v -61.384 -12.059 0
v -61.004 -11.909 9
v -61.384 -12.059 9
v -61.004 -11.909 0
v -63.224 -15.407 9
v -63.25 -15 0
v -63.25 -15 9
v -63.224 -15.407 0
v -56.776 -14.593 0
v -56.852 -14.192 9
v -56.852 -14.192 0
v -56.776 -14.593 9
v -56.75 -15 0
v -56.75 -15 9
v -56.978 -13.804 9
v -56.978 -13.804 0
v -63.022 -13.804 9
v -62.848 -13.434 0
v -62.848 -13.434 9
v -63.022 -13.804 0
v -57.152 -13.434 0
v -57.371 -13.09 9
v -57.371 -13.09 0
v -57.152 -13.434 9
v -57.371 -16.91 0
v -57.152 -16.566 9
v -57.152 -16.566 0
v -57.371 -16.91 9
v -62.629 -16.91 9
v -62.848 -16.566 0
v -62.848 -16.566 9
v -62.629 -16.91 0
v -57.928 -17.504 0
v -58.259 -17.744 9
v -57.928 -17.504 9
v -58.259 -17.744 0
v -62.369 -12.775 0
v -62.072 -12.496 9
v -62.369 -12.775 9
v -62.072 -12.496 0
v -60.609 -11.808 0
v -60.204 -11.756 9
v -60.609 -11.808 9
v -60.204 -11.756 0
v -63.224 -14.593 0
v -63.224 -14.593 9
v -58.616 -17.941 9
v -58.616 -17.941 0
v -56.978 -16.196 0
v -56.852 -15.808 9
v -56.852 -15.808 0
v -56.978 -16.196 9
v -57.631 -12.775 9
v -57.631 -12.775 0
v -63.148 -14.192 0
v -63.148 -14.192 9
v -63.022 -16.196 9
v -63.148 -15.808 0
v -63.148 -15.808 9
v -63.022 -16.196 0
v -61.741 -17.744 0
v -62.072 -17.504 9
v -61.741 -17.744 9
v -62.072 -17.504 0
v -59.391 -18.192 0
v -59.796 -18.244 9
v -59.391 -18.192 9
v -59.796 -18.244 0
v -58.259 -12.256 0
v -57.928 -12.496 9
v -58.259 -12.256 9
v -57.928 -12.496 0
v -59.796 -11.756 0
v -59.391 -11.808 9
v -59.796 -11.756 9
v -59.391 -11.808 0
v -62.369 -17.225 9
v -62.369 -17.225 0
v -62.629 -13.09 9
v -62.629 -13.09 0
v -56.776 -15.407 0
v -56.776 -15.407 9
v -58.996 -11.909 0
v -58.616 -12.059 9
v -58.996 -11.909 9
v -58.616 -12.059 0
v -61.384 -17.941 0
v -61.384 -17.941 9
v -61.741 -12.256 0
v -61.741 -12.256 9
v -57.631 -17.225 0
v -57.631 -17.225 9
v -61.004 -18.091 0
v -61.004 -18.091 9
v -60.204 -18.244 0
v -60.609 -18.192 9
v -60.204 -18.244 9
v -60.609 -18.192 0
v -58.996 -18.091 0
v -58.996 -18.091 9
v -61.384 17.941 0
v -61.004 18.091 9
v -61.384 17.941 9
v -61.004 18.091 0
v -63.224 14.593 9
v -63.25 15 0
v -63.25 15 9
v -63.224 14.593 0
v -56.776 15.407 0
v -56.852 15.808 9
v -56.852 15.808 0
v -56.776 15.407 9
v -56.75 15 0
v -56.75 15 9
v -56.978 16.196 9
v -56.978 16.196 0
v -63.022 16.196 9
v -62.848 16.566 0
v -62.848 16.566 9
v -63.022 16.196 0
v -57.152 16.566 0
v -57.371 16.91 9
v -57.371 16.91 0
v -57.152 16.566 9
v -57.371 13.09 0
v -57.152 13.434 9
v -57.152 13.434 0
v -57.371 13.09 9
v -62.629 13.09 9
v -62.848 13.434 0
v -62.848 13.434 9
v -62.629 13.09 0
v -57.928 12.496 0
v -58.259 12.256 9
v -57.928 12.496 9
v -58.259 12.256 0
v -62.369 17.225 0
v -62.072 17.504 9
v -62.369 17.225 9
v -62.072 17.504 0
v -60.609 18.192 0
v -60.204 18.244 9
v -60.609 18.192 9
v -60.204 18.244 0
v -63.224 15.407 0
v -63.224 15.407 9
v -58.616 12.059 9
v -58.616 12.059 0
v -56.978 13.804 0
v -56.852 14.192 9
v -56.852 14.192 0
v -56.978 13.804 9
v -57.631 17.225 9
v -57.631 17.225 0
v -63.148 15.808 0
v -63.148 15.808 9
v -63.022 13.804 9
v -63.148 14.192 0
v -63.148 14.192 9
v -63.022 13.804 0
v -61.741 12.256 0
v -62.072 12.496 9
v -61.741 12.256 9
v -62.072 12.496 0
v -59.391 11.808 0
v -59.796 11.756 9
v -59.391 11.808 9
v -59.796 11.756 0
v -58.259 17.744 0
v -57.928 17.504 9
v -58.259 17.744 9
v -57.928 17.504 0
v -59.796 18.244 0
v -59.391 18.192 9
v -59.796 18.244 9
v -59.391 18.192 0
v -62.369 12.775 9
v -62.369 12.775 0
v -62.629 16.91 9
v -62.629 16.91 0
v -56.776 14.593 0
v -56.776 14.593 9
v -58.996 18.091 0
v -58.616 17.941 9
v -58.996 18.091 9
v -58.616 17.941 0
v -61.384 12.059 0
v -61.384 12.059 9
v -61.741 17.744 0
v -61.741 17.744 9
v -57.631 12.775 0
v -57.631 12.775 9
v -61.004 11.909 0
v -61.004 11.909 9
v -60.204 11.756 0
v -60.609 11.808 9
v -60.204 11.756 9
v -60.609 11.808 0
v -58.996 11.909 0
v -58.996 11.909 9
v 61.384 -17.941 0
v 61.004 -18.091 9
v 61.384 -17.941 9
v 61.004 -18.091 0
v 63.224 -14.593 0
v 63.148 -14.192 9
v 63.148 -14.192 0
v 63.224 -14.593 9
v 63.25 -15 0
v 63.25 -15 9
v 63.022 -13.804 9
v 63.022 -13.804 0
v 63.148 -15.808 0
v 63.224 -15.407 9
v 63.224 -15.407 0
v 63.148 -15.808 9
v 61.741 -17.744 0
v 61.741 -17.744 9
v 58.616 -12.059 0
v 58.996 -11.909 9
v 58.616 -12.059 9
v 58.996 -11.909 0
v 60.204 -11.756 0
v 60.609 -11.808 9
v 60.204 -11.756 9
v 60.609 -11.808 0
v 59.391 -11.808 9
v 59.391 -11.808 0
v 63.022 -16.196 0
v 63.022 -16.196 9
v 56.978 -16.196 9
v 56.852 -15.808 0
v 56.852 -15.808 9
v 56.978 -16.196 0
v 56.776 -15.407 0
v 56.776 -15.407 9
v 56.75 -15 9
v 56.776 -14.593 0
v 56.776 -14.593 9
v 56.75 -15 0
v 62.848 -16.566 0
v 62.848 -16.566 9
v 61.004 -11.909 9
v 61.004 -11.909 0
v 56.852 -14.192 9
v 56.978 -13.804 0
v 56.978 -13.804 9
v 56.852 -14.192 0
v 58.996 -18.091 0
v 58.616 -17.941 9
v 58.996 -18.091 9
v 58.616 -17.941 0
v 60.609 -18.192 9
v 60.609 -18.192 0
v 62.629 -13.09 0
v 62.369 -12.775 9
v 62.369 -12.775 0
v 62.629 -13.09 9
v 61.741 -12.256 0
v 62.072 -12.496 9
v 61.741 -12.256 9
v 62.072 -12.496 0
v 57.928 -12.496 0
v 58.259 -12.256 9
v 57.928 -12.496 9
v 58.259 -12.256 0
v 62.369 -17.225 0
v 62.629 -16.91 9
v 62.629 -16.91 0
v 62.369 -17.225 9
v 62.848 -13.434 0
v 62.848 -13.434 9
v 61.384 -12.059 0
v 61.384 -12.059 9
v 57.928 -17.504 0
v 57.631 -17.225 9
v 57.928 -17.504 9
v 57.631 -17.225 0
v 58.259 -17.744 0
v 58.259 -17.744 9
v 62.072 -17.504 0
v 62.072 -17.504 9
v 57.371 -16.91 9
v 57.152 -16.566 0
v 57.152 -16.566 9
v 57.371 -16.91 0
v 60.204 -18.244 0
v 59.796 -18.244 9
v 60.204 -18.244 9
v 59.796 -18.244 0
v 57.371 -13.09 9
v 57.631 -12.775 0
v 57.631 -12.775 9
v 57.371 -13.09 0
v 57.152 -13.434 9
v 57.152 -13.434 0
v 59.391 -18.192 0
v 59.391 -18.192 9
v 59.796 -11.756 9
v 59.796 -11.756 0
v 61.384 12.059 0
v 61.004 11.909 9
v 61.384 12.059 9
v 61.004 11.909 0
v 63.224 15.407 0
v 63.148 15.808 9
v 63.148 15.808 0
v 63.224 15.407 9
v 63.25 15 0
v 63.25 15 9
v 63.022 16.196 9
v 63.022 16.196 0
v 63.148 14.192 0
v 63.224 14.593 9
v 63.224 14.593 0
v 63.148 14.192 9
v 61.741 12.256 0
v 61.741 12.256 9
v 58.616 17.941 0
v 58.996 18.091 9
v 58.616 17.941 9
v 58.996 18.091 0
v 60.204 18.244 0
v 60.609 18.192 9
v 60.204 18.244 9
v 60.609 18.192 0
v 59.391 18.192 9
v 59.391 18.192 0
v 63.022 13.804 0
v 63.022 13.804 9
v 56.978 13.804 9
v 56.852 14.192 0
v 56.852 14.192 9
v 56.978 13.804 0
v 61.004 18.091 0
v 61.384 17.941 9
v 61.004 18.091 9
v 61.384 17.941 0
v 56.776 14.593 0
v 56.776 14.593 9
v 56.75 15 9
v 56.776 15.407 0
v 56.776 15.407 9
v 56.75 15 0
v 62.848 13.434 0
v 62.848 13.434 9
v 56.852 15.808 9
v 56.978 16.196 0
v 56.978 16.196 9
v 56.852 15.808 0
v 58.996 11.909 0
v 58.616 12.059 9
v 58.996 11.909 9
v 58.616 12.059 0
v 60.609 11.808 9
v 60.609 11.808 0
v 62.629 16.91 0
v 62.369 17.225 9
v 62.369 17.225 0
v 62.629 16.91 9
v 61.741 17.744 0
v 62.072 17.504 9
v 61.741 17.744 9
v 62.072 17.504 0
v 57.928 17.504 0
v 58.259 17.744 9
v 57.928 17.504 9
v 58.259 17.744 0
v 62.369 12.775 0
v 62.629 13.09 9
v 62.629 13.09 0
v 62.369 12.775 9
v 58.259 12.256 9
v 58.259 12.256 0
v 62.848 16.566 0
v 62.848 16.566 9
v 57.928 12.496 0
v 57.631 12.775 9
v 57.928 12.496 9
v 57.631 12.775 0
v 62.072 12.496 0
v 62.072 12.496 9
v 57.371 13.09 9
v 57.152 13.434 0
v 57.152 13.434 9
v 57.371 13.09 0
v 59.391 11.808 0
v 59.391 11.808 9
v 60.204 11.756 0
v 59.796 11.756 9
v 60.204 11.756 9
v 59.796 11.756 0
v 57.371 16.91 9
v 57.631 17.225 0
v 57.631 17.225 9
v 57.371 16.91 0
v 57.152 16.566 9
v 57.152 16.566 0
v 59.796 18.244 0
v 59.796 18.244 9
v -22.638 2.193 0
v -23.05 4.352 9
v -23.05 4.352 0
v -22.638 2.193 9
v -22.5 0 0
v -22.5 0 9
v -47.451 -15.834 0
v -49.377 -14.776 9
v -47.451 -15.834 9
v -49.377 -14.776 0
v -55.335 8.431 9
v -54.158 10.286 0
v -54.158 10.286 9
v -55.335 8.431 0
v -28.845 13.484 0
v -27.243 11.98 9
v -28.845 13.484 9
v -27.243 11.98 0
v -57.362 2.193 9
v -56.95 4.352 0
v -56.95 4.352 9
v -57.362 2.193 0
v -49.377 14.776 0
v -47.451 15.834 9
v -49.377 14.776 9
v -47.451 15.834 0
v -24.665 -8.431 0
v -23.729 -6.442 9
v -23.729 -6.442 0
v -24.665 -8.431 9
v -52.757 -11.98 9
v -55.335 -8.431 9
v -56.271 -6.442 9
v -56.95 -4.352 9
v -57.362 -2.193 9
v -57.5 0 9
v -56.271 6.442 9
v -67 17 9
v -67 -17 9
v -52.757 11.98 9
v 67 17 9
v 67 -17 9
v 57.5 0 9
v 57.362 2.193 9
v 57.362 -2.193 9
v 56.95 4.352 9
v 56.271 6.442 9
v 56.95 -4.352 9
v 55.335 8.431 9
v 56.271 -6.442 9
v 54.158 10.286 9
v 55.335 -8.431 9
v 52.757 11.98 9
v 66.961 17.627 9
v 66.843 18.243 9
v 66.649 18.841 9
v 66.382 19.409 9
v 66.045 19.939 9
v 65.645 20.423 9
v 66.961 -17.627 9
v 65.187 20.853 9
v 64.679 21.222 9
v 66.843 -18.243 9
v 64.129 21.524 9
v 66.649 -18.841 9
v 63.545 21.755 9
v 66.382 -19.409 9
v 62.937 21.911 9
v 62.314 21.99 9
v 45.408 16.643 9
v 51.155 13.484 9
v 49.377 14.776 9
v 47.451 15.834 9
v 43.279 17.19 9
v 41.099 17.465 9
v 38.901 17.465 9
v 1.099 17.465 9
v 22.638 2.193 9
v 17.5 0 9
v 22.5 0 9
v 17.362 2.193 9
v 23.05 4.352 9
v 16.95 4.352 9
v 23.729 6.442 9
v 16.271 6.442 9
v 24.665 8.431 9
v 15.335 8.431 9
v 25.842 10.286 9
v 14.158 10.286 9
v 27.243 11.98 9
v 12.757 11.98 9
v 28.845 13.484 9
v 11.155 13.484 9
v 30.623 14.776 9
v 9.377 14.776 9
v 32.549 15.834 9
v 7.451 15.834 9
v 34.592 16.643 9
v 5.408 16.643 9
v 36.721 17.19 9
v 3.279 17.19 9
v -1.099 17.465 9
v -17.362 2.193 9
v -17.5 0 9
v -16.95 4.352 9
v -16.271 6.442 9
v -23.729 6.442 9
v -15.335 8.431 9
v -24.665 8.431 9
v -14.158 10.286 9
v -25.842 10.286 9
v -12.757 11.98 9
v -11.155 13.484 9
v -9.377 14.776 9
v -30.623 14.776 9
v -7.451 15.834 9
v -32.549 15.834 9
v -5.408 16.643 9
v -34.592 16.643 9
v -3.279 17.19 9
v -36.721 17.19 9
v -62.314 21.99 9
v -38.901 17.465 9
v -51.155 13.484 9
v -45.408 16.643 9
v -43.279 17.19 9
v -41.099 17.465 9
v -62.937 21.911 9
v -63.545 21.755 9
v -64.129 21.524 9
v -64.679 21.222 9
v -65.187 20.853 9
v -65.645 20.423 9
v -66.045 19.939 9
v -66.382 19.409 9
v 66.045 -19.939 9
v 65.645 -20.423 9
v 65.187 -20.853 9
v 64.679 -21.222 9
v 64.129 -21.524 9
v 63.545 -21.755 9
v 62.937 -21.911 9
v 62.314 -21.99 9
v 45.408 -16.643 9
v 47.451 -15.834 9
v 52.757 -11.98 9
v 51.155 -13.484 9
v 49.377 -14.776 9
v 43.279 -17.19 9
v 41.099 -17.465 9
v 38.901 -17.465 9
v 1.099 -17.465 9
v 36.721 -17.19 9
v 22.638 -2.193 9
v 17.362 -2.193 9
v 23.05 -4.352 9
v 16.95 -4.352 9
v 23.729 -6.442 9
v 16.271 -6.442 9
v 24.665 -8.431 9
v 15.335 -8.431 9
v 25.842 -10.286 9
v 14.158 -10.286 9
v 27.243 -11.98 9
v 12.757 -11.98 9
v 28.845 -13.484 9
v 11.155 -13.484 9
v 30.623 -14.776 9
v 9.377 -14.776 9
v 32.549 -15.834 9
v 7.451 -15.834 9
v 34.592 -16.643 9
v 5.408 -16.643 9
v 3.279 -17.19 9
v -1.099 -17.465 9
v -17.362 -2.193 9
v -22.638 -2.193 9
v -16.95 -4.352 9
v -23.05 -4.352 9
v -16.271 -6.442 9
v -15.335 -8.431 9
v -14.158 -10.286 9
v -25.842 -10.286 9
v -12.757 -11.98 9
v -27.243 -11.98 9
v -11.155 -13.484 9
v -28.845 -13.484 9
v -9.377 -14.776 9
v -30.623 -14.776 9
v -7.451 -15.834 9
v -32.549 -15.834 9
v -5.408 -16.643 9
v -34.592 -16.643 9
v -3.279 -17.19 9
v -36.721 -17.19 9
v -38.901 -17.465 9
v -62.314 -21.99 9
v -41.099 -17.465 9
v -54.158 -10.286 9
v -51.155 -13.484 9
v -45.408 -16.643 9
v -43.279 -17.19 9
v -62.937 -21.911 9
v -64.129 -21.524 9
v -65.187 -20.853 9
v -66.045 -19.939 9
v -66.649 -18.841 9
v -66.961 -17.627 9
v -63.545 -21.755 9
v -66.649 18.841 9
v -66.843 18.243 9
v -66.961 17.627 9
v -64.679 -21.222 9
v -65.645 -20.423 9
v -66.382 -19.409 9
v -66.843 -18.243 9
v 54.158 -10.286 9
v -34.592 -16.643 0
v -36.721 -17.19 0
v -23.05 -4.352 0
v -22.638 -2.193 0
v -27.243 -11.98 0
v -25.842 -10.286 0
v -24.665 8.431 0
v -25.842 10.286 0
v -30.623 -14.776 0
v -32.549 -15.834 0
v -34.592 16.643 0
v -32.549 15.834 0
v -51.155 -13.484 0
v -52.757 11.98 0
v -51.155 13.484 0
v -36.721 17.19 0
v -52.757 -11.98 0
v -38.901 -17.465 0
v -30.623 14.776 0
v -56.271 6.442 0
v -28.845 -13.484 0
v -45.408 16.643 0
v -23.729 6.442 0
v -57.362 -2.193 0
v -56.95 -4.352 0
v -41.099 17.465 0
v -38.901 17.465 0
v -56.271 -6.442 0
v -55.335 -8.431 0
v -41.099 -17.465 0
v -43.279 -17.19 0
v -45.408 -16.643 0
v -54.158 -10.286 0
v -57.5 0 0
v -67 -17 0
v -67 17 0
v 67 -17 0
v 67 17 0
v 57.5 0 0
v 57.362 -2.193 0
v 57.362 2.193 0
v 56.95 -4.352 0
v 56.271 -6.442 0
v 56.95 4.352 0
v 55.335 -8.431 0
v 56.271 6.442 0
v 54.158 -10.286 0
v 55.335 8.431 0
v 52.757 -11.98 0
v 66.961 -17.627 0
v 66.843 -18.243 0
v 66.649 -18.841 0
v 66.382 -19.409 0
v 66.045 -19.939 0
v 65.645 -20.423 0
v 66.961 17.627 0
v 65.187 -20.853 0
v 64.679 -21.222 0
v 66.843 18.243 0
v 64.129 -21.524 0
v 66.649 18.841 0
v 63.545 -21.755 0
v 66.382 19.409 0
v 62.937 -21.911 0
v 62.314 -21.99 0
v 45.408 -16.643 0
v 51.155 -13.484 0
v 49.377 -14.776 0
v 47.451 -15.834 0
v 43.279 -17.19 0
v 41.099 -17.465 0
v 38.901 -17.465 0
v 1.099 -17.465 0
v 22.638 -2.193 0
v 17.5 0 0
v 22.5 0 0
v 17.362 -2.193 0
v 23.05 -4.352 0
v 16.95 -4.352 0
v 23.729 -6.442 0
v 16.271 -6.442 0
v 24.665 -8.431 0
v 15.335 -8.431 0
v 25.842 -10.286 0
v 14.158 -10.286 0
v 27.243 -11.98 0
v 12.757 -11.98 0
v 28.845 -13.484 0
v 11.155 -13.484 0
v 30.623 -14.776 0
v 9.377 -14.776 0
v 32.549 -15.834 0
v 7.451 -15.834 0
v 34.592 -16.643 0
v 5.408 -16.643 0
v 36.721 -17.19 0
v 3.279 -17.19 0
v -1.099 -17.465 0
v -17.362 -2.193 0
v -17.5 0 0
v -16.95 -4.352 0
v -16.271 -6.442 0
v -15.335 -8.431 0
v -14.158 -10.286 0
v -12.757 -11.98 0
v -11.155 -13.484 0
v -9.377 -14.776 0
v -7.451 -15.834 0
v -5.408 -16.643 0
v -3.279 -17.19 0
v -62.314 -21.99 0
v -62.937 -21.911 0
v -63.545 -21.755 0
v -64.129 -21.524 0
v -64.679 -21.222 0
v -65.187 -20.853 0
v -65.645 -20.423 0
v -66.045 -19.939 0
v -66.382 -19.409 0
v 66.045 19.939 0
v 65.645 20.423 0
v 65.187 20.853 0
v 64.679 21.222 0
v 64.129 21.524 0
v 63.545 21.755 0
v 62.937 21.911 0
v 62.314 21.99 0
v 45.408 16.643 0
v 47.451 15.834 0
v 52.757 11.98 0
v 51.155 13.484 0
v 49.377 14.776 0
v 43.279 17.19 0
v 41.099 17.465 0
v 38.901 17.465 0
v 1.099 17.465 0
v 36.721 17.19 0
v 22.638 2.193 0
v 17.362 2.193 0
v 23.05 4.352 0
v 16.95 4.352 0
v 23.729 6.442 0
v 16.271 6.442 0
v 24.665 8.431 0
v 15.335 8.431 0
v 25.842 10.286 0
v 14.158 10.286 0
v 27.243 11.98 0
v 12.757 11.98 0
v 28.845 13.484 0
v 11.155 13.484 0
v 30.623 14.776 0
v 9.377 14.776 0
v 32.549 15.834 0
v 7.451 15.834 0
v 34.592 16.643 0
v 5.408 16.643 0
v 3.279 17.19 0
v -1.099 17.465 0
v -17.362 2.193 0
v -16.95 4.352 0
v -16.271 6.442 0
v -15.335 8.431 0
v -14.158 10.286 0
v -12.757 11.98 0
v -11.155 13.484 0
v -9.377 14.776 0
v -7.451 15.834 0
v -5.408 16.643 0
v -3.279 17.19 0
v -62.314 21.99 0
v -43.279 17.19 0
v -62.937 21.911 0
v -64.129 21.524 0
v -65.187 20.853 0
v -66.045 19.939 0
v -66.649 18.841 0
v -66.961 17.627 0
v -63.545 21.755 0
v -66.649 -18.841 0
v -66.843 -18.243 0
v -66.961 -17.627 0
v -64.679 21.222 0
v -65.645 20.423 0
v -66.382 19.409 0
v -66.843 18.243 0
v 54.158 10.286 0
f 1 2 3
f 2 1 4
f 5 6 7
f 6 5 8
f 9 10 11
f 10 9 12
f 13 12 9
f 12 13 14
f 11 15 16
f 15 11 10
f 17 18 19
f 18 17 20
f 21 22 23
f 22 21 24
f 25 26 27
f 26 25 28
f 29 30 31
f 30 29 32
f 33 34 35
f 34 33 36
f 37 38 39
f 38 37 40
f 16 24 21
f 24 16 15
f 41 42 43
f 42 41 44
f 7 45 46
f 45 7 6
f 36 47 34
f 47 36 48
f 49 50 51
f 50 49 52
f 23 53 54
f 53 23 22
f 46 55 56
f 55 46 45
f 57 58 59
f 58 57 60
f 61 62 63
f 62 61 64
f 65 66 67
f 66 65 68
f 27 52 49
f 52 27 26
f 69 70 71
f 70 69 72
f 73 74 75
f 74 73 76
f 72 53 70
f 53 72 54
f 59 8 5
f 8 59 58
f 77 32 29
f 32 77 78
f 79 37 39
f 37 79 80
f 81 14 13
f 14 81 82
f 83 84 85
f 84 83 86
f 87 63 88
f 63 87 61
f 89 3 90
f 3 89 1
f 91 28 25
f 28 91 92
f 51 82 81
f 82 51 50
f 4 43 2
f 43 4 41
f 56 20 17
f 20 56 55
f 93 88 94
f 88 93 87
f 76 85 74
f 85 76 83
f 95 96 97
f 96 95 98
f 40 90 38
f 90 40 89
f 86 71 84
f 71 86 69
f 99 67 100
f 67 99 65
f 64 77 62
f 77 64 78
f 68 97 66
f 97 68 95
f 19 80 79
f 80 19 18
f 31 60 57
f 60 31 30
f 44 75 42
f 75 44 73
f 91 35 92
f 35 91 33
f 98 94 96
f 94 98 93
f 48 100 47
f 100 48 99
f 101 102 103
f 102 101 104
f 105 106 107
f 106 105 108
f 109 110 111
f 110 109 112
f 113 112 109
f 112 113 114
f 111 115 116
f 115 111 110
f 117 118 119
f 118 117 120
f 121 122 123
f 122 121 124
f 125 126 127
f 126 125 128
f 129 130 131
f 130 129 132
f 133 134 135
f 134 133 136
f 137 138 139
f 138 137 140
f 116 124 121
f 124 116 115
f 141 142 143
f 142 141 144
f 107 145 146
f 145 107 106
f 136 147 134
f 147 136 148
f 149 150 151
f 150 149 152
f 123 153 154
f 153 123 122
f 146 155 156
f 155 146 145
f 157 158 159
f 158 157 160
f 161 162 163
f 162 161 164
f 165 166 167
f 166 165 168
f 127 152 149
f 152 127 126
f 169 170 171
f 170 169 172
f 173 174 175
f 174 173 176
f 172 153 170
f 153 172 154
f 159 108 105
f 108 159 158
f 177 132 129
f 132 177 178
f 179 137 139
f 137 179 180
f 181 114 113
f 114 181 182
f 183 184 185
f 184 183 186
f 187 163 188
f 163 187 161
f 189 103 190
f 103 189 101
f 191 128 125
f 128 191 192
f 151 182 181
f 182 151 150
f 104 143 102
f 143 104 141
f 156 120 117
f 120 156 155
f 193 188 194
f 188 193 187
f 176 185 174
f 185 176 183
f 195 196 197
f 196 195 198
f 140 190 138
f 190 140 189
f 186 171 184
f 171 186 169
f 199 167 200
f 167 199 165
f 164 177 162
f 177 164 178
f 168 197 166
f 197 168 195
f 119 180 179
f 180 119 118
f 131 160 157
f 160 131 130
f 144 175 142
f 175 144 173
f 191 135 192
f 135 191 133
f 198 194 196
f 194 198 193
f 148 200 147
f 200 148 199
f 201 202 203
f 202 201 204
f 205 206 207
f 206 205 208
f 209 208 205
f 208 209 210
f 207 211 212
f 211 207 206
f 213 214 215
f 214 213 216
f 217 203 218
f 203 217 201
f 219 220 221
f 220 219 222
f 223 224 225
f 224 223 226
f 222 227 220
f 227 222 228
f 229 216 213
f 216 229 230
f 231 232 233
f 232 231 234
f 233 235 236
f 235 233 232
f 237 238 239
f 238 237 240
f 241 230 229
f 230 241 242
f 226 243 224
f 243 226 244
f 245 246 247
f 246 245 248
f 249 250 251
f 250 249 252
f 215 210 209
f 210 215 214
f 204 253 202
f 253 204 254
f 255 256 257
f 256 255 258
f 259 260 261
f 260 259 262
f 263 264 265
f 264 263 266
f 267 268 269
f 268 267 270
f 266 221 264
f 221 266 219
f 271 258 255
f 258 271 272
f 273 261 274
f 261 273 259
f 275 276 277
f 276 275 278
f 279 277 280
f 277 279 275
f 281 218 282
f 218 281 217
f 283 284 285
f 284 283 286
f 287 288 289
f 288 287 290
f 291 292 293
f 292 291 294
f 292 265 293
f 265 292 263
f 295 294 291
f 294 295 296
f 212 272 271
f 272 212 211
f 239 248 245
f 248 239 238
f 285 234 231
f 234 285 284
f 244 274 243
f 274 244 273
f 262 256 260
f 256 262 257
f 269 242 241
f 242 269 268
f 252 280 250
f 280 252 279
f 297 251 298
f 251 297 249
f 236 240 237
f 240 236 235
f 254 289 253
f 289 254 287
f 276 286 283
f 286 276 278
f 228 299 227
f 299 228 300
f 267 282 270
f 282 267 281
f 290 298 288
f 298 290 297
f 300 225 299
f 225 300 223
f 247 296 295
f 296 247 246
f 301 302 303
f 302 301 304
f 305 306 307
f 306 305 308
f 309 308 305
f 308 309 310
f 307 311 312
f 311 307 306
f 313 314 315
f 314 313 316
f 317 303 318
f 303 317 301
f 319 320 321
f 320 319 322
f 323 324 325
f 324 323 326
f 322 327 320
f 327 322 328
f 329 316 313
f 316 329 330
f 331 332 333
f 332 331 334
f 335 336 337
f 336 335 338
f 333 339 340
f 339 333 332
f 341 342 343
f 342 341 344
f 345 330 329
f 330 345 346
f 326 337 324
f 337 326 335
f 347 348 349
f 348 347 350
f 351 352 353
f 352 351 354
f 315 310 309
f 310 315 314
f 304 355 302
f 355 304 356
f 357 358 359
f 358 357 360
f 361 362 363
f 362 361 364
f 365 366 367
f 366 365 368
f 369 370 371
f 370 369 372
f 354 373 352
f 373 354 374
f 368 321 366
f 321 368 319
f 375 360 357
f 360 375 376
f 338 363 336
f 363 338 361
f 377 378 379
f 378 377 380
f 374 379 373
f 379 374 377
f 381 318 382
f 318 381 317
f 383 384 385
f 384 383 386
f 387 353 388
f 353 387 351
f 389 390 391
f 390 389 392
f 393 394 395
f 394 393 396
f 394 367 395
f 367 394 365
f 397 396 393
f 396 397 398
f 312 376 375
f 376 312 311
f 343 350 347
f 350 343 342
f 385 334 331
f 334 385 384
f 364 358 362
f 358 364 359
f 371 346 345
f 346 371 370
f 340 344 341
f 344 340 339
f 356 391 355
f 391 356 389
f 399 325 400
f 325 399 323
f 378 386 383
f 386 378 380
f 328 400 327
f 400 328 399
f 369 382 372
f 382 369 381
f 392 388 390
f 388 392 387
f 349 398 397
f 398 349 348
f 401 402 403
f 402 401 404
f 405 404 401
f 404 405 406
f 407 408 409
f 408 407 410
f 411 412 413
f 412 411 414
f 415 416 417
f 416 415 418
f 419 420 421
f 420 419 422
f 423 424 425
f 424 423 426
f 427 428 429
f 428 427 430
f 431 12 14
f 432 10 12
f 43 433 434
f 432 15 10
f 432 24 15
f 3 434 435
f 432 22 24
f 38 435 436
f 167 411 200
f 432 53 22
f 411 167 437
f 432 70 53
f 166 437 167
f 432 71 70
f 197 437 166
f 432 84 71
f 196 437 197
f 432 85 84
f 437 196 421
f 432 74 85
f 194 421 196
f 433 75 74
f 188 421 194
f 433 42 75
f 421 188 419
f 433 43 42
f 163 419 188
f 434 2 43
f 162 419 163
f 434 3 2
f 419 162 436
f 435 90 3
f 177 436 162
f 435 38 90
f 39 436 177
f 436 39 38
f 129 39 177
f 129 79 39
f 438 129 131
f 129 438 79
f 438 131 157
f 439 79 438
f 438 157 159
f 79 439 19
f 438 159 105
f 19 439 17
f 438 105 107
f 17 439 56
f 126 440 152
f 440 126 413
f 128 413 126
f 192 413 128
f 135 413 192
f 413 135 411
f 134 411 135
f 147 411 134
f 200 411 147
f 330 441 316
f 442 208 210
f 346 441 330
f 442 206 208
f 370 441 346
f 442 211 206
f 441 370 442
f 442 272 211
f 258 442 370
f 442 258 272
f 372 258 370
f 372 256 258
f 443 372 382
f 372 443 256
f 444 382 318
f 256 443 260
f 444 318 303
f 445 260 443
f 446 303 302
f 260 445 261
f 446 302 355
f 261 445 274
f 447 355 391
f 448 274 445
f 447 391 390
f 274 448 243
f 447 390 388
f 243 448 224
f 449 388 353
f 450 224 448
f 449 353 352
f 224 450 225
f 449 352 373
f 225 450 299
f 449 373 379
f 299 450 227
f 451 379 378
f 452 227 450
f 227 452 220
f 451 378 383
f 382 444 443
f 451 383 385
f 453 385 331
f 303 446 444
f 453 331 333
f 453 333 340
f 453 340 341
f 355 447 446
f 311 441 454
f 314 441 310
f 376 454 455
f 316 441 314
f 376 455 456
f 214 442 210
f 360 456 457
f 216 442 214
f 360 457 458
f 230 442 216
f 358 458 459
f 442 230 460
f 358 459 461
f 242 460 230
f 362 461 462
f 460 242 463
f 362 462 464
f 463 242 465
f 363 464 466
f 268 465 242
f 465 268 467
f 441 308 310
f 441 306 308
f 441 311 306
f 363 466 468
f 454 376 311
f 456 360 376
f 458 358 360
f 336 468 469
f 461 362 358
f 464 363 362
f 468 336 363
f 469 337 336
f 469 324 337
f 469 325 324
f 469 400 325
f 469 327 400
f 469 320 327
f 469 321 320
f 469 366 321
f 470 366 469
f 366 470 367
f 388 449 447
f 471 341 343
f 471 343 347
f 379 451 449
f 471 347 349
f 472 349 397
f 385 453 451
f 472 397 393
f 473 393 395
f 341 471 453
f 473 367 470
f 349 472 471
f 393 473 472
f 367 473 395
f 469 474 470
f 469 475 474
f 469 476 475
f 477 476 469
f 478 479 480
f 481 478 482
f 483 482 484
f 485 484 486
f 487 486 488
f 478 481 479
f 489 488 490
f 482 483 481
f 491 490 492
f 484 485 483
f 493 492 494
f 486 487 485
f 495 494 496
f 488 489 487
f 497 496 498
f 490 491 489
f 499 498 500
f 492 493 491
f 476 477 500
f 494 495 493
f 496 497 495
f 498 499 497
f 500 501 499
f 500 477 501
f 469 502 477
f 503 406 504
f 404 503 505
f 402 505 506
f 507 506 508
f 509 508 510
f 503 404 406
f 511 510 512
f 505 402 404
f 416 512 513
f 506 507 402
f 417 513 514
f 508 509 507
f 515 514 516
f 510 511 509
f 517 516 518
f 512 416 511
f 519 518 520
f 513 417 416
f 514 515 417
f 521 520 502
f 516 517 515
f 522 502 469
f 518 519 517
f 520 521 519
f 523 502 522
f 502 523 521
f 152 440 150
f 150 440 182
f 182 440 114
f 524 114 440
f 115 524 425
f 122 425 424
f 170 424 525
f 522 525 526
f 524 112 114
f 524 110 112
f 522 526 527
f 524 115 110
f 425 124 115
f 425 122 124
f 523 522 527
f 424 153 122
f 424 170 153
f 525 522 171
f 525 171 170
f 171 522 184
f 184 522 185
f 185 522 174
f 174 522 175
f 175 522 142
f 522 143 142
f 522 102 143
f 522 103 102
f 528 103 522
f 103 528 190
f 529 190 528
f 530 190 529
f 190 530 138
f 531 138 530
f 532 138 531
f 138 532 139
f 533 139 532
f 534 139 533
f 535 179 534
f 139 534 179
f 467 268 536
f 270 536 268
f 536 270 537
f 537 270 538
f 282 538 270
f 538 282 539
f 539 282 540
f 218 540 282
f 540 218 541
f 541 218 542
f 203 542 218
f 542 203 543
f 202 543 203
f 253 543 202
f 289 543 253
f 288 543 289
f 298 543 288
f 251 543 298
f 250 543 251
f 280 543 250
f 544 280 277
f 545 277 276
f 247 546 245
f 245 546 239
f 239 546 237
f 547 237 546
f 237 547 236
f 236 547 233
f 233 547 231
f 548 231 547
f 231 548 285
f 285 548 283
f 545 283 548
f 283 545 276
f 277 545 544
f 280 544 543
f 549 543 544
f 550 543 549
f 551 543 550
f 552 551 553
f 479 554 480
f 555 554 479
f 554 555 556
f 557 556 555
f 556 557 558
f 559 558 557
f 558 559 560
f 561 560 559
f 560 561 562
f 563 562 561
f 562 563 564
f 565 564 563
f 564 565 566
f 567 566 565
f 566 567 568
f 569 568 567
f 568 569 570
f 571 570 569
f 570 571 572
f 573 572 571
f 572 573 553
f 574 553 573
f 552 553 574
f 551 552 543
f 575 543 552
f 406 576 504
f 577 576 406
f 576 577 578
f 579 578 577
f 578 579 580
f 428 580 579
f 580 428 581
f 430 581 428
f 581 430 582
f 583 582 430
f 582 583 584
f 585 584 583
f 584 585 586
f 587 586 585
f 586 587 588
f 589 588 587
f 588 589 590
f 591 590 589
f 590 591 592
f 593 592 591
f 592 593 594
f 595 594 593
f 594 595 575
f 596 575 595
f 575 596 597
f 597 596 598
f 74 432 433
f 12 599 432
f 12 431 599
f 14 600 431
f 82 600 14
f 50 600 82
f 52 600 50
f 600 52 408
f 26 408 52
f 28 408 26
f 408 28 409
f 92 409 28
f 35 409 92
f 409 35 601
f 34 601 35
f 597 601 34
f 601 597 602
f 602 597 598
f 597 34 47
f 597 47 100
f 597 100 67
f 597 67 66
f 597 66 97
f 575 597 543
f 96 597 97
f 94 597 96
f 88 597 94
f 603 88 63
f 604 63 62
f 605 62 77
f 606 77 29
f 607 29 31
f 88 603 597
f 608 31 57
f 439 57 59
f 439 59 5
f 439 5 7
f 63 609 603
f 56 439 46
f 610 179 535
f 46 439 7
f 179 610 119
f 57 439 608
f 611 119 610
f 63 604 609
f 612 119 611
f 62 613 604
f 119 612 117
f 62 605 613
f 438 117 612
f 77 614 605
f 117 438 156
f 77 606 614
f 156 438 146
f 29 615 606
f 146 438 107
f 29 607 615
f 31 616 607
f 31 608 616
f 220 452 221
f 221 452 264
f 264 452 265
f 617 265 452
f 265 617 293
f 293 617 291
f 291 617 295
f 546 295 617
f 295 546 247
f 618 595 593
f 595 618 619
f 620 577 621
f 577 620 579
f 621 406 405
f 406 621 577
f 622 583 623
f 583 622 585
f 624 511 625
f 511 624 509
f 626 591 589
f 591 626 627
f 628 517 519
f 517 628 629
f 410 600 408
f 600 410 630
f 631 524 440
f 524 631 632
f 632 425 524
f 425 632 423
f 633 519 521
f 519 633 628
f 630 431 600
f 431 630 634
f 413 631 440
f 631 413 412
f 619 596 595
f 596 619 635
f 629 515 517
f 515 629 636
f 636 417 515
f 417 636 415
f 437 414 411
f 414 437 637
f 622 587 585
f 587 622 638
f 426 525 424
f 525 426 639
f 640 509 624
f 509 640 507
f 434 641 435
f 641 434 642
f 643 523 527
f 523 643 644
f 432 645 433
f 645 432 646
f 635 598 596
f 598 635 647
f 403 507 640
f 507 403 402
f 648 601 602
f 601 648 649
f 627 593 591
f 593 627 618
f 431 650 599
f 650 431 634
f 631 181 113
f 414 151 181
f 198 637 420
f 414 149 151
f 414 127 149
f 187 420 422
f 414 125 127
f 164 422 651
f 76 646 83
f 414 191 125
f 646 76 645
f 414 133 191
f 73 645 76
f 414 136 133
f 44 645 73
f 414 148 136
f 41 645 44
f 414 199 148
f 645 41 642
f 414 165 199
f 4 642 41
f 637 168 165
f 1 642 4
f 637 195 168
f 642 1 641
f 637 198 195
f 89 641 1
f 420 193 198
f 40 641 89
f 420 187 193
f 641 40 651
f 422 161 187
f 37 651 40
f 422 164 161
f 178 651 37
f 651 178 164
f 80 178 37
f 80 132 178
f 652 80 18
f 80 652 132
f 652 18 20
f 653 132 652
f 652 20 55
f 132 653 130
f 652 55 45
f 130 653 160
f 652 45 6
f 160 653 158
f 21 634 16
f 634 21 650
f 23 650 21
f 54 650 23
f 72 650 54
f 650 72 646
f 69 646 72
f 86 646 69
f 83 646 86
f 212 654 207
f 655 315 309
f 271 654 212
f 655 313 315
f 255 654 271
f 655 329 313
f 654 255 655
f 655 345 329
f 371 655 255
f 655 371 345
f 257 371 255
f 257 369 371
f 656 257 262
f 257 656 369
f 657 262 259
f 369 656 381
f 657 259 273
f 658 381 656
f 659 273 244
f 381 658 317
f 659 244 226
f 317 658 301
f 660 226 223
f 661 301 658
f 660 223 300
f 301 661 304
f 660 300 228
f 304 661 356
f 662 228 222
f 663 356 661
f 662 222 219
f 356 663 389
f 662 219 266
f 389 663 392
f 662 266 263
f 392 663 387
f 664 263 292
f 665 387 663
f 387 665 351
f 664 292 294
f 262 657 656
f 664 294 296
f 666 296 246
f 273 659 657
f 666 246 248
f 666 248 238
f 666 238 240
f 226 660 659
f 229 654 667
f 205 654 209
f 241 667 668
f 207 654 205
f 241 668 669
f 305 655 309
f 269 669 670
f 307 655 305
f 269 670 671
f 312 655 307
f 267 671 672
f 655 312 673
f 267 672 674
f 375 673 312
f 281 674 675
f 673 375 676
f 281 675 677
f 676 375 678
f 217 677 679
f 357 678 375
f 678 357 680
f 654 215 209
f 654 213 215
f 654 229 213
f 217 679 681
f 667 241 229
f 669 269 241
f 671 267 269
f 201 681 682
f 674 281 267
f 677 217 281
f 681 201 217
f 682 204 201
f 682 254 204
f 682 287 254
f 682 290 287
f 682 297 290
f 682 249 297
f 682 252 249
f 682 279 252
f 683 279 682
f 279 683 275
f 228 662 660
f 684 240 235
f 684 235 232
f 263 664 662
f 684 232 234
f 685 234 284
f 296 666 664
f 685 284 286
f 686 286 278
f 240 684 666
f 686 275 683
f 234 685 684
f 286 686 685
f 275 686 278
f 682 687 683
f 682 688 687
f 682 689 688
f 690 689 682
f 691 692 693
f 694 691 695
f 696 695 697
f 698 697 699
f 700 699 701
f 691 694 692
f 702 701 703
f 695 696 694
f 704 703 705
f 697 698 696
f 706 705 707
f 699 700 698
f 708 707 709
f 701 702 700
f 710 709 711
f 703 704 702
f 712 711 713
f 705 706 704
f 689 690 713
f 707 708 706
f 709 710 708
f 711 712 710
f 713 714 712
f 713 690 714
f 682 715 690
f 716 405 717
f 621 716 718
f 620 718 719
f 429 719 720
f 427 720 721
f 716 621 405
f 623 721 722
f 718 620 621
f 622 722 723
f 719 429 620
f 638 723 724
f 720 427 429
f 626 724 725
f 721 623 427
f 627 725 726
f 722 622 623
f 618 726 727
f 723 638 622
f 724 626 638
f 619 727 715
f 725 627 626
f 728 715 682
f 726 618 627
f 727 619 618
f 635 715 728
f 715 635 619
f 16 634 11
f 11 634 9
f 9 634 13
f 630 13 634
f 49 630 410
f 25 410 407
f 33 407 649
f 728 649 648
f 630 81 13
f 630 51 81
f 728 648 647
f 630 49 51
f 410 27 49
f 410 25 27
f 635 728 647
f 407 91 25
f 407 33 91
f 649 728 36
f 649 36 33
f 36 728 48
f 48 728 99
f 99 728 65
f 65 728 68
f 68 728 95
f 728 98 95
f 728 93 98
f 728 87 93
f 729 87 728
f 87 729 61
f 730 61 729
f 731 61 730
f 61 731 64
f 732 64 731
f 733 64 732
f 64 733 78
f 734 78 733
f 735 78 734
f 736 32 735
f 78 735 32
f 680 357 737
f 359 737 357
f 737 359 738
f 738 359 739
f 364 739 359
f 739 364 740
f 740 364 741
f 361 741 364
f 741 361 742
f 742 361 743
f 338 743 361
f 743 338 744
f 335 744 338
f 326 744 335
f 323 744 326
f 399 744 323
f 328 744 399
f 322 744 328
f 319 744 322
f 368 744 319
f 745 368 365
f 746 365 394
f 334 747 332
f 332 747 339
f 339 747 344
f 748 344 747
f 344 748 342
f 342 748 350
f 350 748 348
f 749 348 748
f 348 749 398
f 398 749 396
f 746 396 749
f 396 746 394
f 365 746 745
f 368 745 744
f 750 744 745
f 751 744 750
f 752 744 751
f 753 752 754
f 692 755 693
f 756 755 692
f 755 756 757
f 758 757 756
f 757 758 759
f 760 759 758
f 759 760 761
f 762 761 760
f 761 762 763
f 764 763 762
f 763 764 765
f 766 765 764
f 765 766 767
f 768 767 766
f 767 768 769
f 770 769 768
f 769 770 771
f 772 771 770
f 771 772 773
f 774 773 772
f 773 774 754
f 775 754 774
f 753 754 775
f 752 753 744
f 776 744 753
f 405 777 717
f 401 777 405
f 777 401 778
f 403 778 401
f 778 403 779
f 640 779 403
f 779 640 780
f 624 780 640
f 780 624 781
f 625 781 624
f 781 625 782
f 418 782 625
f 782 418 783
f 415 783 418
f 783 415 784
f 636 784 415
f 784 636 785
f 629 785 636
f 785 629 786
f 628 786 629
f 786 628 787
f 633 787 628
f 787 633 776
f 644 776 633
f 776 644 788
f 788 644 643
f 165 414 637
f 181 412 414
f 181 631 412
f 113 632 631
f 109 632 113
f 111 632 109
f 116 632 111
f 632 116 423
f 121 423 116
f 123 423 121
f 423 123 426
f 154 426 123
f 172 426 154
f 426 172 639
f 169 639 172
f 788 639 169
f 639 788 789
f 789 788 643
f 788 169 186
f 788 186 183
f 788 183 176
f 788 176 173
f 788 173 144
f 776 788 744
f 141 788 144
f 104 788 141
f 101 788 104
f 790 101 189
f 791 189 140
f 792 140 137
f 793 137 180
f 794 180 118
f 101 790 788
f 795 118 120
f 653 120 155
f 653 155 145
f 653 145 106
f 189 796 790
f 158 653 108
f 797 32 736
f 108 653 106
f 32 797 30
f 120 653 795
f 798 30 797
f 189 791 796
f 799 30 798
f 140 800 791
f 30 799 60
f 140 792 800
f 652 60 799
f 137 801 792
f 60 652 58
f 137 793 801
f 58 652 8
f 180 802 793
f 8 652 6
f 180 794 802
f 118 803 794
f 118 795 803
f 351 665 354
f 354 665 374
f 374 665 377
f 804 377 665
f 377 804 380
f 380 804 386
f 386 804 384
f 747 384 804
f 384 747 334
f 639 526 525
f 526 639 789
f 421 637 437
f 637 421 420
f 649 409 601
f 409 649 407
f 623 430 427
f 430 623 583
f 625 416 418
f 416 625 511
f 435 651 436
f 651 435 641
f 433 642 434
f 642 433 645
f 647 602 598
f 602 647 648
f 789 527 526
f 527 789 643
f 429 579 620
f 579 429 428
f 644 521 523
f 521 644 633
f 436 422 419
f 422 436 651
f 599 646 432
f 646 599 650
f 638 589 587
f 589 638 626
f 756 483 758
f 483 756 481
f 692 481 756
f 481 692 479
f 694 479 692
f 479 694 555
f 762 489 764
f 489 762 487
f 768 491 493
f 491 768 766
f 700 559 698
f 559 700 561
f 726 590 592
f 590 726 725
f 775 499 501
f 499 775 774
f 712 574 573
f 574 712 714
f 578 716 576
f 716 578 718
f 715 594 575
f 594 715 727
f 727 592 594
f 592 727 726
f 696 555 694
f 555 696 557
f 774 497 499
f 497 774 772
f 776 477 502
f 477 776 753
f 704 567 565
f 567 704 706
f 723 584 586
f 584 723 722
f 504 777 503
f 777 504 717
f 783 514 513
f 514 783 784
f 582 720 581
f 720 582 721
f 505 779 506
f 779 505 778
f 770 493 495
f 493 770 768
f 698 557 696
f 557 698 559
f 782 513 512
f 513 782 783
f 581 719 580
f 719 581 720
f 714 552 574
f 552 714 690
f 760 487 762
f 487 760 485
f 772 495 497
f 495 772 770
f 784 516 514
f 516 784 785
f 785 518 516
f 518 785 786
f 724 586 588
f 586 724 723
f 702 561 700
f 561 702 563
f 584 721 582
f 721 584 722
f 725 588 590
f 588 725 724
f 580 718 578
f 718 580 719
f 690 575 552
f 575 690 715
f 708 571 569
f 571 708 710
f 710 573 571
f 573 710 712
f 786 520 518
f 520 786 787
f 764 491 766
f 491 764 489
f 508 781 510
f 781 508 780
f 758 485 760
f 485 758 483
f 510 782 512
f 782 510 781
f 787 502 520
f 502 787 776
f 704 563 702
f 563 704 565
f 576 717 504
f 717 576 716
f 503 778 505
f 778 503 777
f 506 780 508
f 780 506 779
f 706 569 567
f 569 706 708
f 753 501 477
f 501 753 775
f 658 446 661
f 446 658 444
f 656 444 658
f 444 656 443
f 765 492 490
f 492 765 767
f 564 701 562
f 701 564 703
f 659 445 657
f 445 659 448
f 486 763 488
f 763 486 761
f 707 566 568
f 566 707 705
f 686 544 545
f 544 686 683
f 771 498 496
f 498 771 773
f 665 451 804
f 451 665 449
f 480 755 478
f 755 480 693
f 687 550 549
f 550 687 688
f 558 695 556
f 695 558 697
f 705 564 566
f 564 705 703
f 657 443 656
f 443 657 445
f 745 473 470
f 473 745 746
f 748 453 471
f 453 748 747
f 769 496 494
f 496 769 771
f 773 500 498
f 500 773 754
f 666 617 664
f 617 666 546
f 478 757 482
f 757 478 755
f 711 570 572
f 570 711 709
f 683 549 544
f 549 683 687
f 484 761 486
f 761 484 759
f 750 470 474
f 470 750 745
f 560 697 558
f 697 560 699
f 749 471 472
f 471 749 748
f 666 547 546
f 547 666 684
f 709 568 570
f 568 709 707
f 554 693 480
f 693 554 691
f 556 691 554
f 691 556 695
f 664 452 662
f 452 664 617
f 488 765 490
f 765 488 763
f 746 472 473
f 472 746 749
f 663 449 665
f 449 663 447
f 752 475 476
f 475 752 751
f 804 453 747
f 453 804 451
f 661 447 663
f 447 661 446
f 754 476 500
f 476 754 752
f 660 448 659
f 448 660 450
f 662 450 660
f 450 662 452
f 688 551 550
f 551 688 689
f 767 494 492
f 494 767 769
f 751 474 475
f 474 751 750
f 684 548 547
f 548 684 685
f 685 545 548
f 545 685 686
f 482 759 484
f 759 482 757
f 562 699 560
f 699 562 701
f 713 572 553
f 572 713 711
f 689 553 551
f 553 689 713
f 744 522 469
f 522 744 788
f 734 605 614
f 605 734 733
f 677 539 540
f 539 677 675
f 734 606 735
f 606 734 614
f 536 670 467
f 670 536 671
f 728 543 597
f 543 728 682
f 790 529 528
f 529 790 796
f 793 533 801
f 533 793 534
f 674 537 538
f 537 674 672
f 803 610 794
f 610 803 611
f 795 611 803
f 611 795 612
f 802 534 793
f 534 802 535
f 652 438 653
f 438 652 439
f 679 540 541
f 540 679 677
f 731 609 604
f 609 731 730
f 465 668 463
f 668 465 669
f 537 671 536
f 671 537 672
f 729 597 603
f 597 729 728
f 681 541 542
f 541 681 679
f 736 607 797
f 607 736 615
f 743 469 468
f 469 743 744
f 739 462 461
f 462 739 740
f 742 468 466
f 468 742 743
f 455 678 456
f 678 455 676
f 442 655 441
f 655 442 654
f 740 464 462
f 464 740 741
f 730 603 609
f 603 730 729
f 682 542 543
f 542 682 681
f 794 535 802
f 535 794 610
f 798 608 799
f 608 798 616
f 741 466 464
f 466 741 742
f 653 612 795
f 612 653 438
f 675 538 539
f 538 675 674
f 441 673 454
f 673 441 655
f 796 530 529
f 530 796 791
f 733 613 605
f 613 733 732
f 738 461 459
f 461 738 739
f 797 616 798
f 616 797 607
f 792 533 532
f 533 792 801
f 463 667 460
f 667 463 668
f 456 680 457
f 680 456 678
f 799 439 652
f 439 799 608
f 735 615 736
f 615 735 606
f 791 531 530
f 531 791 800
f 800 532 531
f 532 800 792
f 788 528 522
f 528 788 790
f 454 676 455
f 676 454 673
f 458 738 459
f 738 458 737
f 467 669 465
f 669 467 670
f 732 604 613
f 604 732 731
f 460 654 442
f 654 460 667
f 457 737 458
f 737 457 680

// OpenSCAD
$fn = 50;


difference() {
	union() {
		hull() {
			translate(v = [-62.0000000000, 17.0000000000, 0]) {
				cylinder(h = 9, r = 5);
			}
			translate(v = [62.0000000000, 17.0000000000, 0]) {
				cylinder(h = 9, r = 5);
			}
			translate(v = [-62.0000000000, -17.0000000000, 0]) {
				cylinder(h = 9, r = 5);
			}
			translate(v = [62.0000000000, -17.0000000000, 0]) {
				cylinder(h = 9, r = 5);
			}
		}
	}
	union() {
		#translate(v = [-60.0000000000, -15.0000000000, -100.0000000000]) {
			cylinder(h = 200, r = 3.2500000000);
		}
		#translate(v = [-60.0000000000, 15.0000000000, -100.0000000000]) {
			cylinder(h = 200, r = 3.2500000000);
		}
		#translate(v = [60.0000000000, -15.0000000000, -100.0000000000]) {
			cylinder(h = 200, r = 3.2500000000);
		}
		#translate(v = [60.0000000000, 15.0000000000, -100.0000000000]) {
			cylinder(h = 200, r = 3.2500000000);
		}
		#translate(v = [-40.0000000000, 0, 0]) {
			cylinder(h = 9, r = 17.5000000000);
		}
		#cylinder(h = 9, r = 17.5000000000);
		#translate(v = [40.0000000000, 0, 0]) {
			cylinder(h = 9, r = 17.5000000000);
		}
	}
}
